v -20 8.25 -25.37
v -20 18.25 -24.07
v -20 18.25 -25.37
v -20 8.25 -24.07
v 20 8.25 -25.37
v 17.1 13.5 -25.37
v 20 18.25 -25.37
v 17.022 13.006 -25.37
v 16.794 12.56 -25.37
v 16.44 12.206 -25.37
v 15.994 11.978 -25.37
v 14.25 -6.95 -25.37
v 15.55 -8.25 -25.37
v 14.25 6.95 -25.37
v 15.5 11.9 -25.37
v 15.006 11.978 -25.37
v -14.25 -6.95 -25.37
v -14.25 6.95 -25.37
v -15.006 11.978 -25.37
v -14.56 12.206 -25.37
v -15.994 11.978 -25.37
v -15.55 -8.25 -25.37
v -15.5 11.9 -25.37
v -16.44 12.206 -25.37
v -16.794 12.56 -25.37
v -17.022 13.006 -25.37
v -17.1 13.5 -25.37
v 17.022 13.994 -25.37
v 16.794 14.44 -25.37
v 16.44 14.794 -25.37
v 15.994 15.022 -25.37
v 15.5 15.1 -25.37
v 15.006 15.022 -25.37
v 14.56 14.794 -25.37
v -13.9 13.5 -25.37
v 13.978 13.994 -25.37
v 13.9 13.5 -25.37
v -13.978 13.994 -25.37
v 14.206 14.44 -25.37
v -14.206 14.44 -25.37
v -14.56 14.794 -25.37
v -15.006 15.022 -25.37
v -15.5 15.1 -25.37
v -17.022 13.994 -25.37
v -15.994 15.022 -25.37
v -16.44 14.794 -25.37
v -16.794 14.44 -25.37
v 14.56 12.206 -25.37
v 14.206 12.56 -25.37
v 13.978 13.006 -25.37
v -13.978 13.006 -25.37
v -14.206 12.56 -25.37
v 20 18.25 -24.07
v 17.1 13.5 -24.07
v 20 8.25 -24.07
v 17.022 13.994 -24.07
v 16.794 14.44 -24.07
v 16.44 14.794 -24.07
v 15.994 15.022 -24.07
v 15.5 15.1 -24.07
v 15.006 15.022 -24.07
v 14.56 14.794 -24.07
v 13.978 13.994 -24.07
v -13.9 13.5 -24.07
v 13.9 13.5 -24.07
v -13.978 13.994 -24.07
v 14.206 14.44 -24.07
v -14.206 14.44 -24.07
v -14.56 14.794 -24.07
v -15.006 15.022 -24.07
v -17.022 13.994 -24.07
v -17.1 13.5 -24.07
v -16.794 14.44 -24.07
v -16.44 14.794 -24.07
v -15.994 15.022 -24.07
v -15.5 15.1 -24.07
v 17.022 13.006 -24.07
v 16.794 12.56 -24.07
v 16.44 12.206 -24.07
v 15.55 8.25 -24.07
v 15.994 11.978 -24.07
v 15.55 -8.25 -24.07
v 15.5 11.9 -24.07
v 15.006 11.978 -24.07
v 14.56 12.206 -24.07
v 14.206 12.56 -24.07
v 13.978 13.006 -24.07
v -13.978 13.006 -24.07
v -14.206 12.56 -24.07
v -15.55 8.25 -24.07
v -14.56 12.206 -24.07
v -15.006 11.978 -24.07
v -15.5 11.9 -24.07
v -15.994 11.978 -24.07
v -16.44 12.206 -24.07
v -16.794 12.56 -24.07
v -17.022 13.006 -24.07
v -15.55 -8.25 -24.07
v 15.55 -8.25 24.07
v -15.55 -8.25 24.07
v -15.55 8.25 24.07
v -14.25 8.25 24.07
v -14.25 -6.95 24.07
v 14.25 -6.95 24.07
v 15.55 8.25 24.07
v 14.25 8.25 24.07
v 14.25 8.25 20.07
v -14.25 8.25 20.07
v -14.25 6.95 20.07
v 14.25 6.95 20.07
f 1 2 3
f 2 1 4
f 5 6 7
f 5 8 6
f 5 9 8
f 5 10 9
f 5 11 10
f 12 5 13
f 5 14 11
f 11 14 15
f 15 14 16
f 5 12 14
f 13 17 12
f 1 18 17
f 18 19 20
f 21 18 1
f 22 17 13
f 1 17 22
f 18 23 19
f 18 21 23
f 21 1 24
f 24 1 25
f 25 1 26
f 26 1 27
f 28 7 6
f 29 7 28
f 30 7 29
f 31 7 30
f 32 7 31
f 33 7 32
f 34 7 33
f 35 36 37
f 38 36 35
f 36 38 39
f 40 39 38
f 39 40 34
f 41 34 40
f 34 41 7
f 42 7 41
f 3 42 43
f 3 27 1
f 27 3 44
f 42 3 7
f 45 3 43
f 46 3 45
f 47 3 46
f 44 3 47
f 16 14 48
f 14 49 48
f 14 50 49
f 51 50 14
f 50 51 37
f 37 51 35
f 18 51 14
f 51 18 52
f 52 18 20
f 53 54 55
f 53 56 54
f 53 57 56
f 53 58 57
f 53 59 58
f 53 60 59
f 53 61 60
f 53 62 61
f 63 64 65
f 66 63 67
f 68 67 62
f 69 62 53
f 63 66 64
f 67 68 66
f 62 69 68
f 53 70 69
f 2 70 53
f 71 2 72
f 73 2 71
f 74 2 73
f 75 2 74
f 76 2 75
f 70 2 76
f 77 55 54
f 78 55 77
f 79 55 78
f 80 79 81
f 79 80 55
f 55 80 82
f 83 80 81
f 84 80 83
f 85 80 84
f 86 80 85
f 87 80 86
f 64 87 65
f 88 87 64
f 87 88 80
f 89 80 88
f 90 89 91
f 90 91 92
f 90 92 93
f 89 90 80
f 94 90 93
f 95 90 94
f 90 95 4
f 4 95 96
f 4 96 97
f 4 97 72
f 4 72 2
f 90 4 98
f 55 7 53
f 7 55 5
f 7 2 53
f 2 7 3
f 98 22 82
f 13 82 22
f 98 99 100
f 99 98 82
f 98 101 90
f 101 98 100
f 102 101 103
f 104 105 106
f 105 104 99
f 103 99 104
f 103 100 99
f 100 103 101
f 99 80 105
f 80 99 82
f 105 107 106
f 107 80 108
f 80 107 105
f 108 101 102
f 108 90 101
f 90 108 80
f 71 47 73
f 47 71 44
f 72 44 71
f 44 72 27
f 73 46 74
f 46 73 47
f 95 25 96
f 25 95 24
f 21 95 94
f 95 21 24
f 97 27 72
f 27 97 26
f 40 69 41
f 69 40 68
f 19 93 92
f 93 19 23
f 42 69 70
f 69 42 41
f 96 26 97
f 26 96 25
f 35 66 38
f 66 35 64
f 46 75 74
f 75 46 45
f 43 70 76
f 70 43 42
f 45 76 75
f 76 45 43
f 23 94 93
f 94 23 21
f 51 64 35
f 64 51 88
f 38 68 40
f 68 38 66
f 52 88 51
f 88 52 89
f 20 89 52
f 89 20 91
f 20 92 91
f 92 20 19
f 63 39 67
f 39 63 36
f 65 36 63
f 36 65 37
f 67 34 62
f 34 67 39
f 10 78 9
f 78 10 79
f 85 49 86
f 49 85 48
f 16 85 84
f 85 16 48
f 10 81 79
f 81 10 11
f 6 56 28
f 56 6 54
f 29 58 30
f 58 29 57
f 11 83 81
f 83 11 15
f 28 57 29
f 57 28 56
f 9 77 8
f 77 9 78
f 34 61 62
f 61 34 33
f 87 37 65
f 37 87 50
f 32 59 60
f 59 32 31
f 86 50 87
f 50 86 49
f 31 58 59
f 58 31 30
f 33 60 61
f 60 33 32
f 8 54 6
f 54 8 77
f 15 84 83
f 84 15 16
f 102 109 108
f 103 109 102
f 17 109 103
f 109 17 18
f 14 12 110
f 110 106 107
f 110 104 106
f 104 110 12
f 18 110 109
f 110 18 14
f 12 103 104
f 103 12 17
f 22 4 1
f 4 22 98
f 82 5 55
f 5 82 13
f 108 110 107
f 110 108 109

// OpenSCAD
//by Eric Hughes specifically for a MakerFront i3Pro
//circle precision
$fn=20;
//inner switch width
ix=28.5;//28.3
//inner switch depth
iy=13.9;
//wall thickness
wt=1.3;//1.2
//motor + bracket height
mbz= 43.14;
//customize height lower than motor in front and sides (covers wires, zero if flush with motor)
mz = 5;
//customize height lower than motor in back (zero if flush)
mzb = 1;
//distance between both scres holes
hx=31;
//overhang into motermount bracket
mby=10;
//overhang into motermount bracket
mbx=40;

rotate([0,180,0]){
difference(){
    union(){
        TopPlate();
        cube([2*wt+ix, 2*wt+iy, mbz+mz], center=true);
    }
    cube([ix, iy, 100], center=true);
    LeftTriangleCut();
    RightTriangleCut();
    screwholes();
    BottomCut();
}}

module BottomCut(){
    translate([0,wt+.01,-50-(mbz+mz)/2+(mz-mzb)])
     cube([ix, iy, 100], center=true);
}


module TopPlate(){
translate([0,mby/2,(mbz+mz+wt)/2]){
cube([mbx,mby+2*wt+iy, wt],center=true);}}

module RightTriangleCut(){
linear_extrude(height=100, center=true){
 polygon(points=[[-(2*wt+ix)/2,-(2*wt+iy)/2-.001],[-(mbx)/2-.001,-(2*wt+iy)/2-.001],[-(mbx)/2,(2*wt+iy)/2]]);}}

module LeftTriangleCut(){
    mirror([1,0,0]) RightTriangleCut();
}

module screwholes(){
translate([0,(2*wt+iy)/2+5.25,]){
translate([hx/2,0,0]){
 cylinder(100, d=3.2, center=true);
}
translate([-hx/2,0,0]){
 cylinder(100, d=3.2, center=true);
}}}
